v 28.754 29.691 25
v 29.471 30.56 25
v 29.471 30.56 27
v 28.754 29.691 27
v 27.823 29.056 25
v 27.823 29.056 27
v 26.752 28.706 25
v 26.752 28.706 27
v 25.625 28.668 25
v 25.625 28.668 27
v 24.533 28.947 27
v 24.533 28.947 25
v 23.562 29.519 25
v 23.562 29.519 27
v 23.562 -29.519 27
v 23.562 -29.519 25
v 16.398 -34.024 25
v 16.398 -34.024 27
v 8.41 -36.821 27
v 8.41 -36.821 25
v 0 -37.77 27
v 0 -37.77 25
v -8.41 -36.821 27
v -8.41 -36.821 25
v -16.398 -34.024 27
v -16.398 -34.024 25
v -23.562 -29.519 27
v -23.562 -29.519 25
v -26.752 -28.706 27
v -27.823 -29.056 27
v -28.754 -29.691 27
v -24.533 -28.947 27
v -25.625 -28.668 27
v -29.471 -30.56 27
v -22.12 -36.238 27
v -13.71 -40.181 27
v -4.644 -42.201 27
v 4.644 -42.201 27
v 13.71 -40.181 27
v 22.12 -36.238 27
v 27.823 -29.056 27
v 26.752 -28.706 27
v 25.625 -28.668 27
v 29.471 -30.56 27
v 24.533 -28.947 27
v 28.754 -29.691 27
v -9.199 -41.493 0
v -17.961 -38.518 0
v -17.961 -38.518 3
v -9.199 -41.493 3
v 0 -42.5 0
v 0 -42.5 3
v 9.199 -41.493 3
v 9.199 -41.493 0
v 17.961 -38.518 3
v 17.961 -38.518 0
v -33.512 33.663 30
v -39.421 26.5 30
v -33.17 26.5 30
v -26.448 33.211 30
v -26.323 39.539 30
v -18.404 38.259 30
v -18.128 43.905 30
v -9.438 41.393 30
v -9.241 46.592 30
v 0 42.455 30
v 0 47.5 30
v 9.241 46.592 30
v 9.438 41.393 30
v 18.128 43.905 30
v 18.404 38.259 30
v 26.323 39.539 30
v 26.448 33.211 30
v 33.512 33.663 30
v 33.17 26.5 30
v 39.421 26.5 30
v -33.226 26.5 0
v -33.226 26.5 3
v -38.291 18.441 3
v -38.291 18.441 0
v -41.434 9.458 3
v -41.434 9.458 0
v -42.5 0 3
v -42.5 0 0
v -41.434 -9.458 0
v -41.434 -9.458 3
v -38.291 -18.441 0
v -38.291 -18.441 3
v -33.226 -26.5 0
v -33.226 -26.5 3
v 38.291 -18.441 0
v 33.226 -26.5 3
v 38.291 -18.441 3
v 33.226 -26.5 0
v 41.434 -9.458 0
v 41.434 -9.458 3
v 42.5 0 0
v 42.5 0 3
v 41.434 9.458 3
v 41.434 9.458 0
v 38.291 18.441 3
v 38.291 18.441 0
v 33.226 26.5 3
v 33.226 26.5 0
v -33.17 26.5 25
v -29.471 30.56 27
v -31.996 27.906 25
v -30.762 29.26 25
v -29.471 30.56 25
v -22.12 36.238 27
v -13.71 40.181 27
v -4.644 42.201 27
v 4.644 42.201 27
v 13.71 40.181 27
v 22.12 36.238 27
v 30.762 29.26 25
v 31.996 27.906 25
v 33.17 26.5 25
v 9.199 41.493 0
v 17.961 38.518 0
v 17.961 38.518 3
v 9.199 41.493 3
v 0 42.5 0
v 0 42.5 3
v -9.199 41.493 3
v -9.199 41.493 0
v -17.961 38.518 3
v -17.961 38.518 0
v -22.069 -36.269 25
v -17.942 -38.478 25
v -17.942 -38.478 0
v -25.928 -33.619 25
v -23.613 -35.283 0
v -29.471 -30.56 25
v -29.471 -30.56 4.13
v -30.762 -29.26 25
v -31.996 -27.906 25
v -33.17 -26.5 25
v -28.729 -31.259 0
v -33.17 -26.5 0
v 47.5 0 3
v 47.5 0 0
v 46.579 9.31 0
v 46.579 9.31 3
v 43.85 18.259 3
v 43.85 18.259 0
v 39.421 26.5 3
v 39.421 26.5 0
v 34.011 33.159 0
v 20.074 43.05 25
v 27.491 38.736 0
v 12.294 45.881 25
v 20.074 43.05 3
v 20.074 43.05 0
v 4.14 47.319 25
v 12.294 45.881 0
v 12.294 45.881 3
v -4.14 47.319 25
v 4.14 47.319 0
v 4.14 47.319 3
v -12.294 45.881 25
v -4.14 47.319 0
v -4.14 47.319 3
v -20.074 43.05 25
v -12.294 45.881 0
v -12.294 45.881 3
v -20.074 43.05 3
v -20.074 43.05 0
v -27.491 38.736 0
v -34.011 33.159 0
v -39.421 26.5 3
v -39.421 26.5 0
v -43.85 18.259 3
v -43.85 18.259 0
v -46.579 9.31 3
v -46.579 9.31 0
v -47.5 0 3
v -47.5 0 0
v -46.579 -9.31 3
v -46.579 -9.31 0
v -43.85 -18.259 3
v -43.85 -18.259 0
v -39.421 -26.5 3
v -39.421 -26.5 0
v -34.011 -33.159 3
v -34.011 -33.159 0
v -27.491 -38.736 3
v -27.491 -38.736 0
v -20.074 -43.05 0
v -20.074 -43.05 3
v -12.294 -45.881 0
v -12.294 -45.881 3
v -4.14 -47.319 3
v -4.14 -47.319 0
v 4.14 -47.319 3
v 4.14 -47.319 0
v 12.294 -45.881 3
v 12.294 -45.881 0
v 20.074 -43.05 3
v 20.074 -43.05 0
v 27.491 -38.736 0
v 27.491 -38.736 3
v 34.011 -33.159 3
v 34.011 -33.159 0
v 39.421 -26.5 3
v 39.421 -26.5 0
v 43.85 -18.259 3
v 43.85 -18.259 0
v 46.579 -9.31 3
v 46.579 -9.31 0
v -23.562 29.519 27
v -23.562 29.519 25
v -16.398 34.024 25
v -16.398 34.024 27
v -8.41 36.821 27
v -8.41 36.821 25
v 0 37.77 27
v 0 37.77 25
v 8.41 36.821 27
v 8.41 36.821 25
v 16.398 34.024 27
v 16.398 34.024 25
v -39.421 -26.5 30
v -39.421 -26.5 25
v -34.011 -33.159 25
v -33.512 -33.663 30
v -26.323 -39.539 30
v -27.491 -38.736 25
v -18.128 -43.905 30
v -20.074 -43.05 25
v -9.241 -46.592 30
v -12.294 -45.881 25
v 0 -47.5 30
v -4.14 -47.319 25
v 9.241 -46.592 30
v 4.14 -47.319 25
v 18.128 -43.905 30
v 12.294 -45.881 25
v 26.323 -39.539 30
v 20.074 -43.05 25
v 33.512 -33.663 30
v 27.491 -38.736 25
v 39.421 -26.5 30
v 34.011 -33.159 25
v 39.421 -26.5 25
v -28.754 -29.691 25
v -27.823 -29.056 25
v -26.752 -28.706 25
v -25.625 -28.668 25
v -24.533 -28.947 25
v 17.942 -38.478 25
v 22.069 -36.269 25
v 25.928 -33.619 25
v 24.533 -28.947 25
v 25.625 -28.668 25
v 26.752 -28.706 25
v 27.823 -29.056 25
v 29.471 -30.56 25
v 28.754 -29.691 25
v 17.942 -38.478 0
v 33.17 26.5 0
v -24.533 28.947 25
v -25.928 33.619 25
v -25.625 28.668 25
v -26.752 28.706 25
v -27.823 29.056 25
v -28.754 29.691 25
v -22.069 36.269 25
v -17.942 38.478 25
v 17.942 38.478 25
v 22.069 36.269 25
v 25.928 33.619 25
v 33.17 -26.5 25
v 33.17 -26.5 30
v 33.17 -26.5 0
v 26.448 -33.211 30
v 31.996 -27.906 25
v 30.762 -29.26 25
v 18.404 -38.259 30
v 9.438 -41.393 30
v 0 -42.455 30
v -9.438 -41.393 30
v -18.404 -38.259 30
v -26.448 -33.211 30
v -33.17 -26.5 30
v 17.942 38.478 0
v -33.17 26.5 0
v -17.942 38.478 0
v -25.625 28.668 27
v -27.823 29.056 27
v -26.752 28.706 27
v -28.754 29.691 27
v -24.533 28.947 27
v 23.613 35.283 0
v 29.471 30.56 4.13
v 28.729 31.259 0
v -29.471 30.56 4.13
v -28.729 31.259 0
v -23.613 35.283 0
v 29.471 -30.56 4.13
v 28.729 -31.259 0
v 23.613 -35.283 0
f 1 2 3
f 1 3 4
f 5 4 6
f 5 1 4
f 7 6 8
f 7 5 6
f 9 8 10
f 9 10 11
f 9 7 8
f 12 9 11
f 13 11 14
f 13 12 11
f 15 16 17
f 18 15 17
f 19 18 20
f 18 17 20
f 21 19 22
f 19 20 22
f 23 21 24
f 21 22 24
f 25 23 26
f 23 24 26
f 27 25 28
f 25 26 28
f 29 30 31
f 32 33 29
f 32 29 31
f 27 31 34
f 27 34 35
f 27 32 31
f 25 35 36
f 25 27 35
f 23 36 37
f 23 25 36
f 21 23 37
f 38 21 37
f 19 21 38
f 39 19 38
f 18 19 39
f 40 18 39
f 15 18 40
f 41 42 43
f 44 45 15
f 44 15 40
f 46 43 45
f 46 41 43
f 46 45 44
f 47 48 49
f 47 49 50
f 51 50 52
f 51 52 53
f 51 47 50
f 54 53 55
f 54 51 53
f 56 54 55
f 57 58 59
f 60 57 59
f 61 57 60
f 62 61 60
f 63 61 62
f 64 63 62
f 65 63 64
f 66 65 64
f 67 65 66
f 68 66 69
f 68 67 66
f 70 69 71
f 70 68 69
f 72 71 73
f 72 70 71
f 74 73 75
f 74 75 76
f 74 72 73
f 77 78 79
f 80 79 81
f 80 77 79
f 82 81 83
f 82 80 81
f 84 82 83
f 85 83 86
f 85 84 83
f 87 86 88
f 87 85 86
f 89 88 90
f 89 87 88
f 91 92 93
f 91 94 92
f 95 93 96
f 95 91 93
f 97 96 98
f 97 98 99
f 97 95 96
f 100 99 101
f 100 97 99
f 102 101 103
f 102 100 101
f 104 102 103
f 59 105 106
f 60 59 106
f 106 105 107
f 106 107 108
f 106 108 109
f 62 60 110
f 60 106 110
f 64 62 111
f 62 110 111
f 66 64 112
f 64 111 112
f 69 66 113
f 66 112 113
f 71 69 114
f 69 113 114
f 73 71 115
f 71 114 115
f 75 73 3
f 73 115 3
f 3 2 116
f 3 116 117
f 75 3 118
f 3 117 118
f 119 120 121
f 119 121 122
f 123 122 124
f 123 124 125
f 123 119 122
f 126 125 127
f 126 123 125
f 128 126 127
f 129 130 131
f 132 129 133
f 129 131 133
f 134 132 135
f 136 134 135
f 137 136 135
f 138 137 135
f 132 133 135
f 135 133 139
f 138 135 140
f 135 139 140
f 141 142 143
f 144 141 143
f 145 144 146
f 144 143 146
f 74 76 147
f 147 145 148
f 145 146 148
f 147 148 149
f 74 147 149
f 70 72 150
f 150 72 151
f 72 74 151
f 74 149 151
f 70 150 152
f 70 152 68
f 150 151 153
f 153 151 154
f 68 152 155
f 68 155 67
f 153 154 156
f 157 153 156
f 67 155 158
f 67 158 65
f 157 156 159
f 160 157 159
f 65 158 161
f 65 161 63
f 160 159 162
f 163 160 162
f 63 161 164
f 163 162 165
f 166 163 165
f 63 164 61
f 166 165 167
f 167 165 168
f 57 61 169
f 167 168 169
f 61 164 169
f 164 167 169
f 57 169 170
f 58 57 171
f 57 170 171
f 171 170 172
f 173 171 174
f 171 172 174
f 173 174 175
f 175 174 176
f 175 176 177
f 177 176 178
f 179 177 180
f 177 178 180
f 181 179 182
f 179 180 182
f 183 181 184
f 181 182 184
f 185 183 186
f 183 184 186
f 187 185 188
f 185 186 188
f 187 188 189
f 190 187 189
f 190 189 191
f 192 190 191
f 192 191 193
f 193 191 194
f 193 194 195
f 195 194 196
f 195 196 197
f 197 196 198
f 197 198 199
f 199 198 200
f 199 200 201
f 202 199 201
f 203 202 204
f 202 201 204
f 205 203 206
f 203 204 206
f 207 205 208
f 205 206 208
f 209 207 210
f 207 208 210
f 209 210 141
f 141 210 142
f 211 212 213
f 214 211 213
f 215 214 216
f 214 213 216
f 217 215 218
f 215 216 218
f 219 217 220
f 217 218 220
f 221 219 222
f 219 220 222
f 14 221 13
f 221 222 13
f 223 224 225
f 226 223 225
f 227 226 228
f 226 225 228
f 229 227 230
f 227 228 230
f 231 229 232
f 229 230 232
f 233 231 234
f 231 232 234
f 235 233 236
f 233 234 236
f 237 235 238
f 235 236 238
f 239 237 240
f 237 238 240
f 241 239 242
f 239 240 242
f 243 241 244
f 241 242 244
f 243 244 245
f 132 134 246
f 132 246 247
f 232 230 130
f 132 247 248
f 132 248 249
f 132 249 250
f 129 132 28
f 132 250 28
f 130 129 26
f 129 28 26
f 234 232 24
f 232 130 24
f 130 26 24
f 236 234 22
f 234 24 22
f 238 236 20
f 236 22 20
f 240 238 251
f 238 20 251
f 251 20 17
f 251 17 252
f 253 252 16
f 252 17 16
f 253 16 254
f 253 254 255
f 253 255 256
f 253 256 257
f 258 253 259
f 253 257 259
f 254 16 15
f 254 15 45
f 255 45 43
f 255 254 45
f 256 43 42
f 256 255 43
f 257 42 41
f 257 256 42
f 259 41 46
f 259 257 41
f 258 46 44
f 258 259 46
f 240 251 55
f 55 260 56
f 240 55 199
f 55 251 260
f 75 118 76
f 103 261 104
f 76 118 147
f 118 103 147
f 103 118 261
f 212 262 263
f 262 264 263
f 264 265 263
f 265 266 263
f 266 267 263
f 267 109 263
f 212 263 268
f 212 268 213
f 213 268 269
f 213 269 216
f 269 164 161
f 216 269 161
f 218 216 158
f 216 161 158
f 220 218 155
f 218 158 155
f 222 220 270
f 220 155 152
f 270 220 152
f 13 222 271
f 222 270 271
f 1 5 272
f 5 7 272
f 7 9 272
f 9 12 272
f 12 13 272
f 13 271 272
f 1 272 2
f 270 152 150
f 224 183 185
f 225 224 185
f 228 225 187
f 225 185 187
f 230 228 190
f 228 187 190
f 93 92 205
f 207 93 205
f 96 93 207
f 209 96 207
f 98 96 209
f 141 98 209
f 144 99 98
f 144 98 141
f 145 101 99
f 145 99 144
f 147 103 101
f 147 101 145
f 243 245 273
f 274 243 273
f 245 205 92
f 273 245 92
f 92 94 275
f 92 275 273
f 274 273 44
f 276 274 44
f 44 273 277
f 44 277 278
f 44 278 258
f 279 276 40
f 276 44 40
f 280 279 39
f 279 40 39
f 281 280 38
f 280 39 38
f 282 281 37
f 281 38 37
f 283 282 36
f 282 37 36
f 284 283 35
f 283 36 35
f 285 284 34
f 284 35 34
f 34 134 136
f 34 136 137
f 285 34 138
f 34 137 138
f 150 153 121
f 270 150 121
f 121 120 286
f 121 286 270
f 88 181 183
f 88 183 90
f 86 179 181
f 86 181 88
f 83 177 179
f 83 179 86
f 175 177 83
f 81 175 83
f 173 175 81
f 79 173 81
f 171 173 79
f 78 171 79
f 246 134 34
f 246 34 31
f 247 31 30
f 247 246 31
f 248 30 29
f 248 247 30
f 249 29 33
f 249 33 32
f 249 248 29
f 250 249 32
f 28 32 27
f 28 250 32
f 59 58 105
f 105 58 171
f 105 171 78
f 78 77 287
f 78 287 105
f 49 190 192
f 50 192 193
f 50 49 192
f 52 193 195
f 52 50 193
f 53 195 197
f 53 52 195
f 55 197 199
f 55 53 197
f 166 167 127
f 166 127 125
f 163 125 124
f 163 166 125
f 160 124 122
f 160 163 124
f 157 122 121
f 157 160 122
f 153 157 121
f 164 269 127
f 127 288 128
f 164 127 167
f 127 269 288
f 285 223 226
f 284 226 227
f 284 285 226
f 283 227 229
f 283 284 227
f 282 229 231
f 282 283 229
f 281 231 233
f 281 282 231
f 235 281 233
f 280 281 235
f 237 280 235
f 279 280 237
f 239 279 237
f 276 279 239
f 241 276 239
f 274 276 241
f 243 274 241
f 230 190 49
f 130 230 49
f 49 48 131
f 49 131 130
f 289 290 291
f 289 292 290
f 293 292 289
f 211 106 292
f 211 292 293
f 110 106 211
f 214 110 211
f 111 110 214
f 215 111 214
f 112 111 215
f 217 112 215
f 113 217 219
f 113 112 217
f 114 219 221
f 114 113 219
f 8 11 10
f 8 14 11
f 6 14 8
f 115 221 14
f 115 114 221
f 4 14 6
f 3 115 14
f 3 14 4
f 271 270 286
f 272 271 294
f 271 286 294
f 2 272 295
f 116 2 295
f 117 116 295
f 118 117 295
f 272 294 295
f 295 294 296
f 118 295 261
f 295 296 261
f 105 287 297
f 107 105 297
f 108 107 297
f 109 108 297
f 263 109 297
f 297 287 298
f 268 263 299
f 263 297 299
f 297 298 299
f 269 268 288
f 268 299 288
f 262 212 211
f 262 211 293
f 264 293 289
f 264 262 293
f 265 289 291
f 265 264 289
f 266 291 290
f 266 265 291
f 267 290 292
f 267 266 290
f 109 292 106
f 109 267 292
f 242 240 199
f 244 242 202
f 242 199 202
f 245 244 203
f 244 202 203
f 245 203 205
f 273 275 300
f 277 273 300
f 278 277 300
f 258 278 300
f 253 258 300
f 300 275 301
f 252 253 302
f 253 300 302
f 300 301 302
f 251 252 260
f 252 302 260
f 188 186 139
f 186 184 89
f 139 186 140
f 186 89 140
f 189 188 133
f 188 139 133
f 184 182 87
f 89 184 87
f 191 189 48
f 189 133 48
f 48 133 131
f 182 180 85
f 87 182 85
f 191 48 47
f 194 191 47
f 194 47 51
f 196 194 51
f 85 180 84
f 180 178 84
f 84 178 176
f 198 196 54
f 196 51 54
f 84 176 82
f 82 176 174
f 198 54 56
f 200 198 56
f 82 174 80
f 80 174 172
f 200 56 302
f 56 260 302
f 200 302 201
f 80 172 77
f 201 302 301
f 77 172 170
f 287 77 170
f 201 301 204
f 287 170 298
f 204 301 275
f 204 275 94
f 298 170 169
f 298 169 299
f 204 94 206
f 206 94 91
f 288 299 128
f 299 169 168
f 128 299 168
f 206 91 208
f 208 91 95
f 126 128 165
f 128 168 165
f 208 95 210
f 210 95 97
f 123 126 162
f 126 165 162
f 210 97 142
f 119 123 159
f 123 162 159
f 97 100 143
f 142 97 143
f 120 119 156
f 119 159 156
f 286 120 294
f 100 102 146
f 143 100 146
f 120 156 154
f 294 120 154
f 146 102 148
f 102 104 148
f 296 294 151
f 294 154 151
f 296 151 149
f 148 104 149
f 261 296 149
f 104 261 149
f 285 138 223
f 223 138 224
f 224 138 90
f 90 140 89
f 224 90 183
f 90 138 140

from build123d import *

# Parameters (mm, degrees)
F0_R        = 47.5
F0_R_2      = 42.5
F1_DEPTH    = 3
F3_DEPTH    = 25
F7_DEPTH    = 5
F8_DEPTH    = 2
F9_T1_DEPTH = 43.7405186698


# Not quite as in the source:
# - a fillet or chamfer that OpenCascade refuses, or shapes differently, is made with other operations: its cross-section is extruded or revolved along the edge and cut away or added


with BuildPart() as f1:
    # F0 (on Top) → F1 (new body)
    with BuildSketch(Plane.XY):
        Circle(F0_R)
        Circle(F0_R_2, mode=Mode.SUBTRACT)
    extrude(amount=F1_DEPTH)

    # F2 (on Top) → F3 (join)
    with BuildSketch(Plane.XY):
        with BuildLine():
            Line((-17.9424604553, 38.4777306174), (-20.0743674327, 43.0496198842))
            ThreePointArc((-20.0743674327, 43.0496198842), (-30.8770370262, 36.0951324209), (-39.4208066889, 26.5))
            Line((-39.4208066889, 26.5), (-33.1695287976, 26.5))
            ThreePointArc((-33.1695287976, 26.5), (-26.2483403101, 33.3690316255), (-17.9424604553, 38.4777306174))
        make_face()
        with BuildLine():
            Line((-20.0743674327, -43.0496198842), (-17.9424604553, -38.4777306174))
            ThreePointArc((-17.9424604553, -38.4777306174), (-26.2483403101, -33.3690316255), (-33.1695287976, -26.5))
            Line((-33.1695287976, -26.5), (-39.4208066889, -26.5))
            ThreePointArc((-39.4208066889, -26.5), (-30.8770370262, -36.0951324209), (-20.0743674327, -43.0496198842))
        make_face()
        with BuildLine():
            Line((20.0743674327, 43.0496198842), (17.9424604553, 38.4777306174))
            ThreePointArc((17.9424604553, 38.4777306174), (26.2483403101, 33.3690316255), (33.1695287976, 26.5))
            Line((33.1695287976, 26.5), (39.4208066889, 26.5))
            ThreePointArc((39.4208066889, 26.5), (30.8770370262, 36.0951324209), (20.0743674327, 43.0496198842))
        make_face()
        with BuildLine():
            ThreePointArc((33.1695287976, -26.5), (26.2483403101, -33.3690316255), (17.9424604553, -38.4777306174))
            Line((17.9424604553, -38.4777306174), (20.0743674327, -43.0496198842))
            ThreePointArc((20.0743674327, -43.0496198842), (30.8770370262, -36.0951324209), (39.4208066889, -26.5))
            Line((39.4208066889, -26.5), (33.1695287976, -26.5))
        make_face()
    extrude(amount=F3_DEPTH)

    # F4 (on face) → F7 (join)
    with BuildSketch(Plane.XY.offset(25)):
        with BuildLine():
            ThreePointArc((39.4208066889, 26.5), (0, 47.5), (-39.4208066889, 26.5))
            Line((-39.4208066889, 26.5), (-33.1695287976, 26.5))
            ThreePointArc((-33.1695287976, 26.5), (0, 42.455478335), (33.1695287976, 26.5))
            Line((33.1695287976, 26.5), (39.4208066889, 26.5))
        make_face()
        with BuildLine():
            Line((-33.1695287976, -26.5), (-39.4208066889, -26.5))
            ThreePointArc((-39.4208066889, -26.5), (0, -47.5), (39.4208066889, -26.5))
            Line((39.4208066889, -26.5), (33.1695287976, -26.5))
            ThreePointArc((33.1695287976, -26.5), (0, -42.455478335), (-33.1695287976, -26.5))
        make_face()
    extrude(amount=F7_DEPTH)

    # F6 (on offset) → F8 (join)
    with BuildSketch(Plane.XY.offset(25)):
        with BuildLine():
            ThreePointArc((-29.4712756106, -30.6217882215), (0, -42.5), (29.4712756106, -30.6217882215))
            Line((29.4712756106, -30.6217882215), (29.4712756106, -23.6217882215))
            ThreePointArc((29.4712756106, -23.6217882215), (0, -37.7696301928), (-29.4712756106, -23.6217882215))
            Line((-29.4712756106, -23.6217882215), (-29.4712756106, -30.6217882215))
        make_face()
        with BuildLine():
            Line((29.4712756106, 23.6217882215), (29.4712756106, 30.6217882215))
            ThreePointArc((29.4712756106, 30.6217882215), (0, 42.5), (-29.4712756106, 30.6217882215))
            Line((-29.4712756106, 30.6217882215), (-29.4712756106, 23.6217882215))
            ThreePointArc((-29.4712756106, 23.6217882215), (0, 37.7696301928), (29.4712756106, 23.6217882215))
        make_face()
    extrude(amount=F8_DEPTH)

    # F9: fillet of radius 4 on 4 edges, made by hand

    # F9_s2 → F9_t1 (cut)
    with BuildSketch(Plane.XY.offset(4.1297406651)):
        with BuildLine():
            ThreePointArc((-29.4712756106, -30.5599665337), (-26.7517914385, -28.7057144703), (-23.5623277872, -29.5188359213))
            ThreePointArc((-23.5623277872, -29.5188359213), (-26.6802279831, -26.7340681466), (-29.4712756106, -23.6217882215))
            Line((-29.4712756106, -23.6217882215), (-29.4712756106, -30.5599665337))
        make_face()
        with BuildLine():
            ThreePointArc((23.5623277872, -29.5188359213), (26.7517914385, -28.7057144703), (29.4712756106, -30.5599665337))
            Line((29.4712756106, -30.5599665337), (29.4712756106, -23.6217882215))
            ThreePointArc((29.4712756106, -23.6217882215), (26.6802279831, -26.7340681466), (23.5623277872, -29.5188359213))
        make_face()
        with BuildLine():
            ThreePointArc((29.4712756106, 30.5599665337), (26.7517914385, 28.7057144703), (23.5623277872, 29.5188359213))
            ThreePointArc((23.5623277872, 29.5188359213), (26.6802279831, 26.7340681466), (29.4712756106, 23.6217882215))
            Line((29.4712756106, 23.6217882215), (29.4712756106, 30.5599665337))
        make_face()
        with BuildLine():
            ThreePointArc((-23.5623277872, 29.5188359213), (-26.7517914385, 28.7057144703), (-29.4712756106, 30.5599665337))
            Line((-29.4712756106, 30.5599665337), (-29.4712756106, 23.6217882215))
            ThreePointArc((-29.4712756106, 23.6217882215), (-26.6802279831, 26.7340681466), (-23.5623277872, 29.5188359213))
        make_face()
    extrude(amount=F9_T1_DEPTH, mode=Mode.SUBTRACT)


solid = f1.part
